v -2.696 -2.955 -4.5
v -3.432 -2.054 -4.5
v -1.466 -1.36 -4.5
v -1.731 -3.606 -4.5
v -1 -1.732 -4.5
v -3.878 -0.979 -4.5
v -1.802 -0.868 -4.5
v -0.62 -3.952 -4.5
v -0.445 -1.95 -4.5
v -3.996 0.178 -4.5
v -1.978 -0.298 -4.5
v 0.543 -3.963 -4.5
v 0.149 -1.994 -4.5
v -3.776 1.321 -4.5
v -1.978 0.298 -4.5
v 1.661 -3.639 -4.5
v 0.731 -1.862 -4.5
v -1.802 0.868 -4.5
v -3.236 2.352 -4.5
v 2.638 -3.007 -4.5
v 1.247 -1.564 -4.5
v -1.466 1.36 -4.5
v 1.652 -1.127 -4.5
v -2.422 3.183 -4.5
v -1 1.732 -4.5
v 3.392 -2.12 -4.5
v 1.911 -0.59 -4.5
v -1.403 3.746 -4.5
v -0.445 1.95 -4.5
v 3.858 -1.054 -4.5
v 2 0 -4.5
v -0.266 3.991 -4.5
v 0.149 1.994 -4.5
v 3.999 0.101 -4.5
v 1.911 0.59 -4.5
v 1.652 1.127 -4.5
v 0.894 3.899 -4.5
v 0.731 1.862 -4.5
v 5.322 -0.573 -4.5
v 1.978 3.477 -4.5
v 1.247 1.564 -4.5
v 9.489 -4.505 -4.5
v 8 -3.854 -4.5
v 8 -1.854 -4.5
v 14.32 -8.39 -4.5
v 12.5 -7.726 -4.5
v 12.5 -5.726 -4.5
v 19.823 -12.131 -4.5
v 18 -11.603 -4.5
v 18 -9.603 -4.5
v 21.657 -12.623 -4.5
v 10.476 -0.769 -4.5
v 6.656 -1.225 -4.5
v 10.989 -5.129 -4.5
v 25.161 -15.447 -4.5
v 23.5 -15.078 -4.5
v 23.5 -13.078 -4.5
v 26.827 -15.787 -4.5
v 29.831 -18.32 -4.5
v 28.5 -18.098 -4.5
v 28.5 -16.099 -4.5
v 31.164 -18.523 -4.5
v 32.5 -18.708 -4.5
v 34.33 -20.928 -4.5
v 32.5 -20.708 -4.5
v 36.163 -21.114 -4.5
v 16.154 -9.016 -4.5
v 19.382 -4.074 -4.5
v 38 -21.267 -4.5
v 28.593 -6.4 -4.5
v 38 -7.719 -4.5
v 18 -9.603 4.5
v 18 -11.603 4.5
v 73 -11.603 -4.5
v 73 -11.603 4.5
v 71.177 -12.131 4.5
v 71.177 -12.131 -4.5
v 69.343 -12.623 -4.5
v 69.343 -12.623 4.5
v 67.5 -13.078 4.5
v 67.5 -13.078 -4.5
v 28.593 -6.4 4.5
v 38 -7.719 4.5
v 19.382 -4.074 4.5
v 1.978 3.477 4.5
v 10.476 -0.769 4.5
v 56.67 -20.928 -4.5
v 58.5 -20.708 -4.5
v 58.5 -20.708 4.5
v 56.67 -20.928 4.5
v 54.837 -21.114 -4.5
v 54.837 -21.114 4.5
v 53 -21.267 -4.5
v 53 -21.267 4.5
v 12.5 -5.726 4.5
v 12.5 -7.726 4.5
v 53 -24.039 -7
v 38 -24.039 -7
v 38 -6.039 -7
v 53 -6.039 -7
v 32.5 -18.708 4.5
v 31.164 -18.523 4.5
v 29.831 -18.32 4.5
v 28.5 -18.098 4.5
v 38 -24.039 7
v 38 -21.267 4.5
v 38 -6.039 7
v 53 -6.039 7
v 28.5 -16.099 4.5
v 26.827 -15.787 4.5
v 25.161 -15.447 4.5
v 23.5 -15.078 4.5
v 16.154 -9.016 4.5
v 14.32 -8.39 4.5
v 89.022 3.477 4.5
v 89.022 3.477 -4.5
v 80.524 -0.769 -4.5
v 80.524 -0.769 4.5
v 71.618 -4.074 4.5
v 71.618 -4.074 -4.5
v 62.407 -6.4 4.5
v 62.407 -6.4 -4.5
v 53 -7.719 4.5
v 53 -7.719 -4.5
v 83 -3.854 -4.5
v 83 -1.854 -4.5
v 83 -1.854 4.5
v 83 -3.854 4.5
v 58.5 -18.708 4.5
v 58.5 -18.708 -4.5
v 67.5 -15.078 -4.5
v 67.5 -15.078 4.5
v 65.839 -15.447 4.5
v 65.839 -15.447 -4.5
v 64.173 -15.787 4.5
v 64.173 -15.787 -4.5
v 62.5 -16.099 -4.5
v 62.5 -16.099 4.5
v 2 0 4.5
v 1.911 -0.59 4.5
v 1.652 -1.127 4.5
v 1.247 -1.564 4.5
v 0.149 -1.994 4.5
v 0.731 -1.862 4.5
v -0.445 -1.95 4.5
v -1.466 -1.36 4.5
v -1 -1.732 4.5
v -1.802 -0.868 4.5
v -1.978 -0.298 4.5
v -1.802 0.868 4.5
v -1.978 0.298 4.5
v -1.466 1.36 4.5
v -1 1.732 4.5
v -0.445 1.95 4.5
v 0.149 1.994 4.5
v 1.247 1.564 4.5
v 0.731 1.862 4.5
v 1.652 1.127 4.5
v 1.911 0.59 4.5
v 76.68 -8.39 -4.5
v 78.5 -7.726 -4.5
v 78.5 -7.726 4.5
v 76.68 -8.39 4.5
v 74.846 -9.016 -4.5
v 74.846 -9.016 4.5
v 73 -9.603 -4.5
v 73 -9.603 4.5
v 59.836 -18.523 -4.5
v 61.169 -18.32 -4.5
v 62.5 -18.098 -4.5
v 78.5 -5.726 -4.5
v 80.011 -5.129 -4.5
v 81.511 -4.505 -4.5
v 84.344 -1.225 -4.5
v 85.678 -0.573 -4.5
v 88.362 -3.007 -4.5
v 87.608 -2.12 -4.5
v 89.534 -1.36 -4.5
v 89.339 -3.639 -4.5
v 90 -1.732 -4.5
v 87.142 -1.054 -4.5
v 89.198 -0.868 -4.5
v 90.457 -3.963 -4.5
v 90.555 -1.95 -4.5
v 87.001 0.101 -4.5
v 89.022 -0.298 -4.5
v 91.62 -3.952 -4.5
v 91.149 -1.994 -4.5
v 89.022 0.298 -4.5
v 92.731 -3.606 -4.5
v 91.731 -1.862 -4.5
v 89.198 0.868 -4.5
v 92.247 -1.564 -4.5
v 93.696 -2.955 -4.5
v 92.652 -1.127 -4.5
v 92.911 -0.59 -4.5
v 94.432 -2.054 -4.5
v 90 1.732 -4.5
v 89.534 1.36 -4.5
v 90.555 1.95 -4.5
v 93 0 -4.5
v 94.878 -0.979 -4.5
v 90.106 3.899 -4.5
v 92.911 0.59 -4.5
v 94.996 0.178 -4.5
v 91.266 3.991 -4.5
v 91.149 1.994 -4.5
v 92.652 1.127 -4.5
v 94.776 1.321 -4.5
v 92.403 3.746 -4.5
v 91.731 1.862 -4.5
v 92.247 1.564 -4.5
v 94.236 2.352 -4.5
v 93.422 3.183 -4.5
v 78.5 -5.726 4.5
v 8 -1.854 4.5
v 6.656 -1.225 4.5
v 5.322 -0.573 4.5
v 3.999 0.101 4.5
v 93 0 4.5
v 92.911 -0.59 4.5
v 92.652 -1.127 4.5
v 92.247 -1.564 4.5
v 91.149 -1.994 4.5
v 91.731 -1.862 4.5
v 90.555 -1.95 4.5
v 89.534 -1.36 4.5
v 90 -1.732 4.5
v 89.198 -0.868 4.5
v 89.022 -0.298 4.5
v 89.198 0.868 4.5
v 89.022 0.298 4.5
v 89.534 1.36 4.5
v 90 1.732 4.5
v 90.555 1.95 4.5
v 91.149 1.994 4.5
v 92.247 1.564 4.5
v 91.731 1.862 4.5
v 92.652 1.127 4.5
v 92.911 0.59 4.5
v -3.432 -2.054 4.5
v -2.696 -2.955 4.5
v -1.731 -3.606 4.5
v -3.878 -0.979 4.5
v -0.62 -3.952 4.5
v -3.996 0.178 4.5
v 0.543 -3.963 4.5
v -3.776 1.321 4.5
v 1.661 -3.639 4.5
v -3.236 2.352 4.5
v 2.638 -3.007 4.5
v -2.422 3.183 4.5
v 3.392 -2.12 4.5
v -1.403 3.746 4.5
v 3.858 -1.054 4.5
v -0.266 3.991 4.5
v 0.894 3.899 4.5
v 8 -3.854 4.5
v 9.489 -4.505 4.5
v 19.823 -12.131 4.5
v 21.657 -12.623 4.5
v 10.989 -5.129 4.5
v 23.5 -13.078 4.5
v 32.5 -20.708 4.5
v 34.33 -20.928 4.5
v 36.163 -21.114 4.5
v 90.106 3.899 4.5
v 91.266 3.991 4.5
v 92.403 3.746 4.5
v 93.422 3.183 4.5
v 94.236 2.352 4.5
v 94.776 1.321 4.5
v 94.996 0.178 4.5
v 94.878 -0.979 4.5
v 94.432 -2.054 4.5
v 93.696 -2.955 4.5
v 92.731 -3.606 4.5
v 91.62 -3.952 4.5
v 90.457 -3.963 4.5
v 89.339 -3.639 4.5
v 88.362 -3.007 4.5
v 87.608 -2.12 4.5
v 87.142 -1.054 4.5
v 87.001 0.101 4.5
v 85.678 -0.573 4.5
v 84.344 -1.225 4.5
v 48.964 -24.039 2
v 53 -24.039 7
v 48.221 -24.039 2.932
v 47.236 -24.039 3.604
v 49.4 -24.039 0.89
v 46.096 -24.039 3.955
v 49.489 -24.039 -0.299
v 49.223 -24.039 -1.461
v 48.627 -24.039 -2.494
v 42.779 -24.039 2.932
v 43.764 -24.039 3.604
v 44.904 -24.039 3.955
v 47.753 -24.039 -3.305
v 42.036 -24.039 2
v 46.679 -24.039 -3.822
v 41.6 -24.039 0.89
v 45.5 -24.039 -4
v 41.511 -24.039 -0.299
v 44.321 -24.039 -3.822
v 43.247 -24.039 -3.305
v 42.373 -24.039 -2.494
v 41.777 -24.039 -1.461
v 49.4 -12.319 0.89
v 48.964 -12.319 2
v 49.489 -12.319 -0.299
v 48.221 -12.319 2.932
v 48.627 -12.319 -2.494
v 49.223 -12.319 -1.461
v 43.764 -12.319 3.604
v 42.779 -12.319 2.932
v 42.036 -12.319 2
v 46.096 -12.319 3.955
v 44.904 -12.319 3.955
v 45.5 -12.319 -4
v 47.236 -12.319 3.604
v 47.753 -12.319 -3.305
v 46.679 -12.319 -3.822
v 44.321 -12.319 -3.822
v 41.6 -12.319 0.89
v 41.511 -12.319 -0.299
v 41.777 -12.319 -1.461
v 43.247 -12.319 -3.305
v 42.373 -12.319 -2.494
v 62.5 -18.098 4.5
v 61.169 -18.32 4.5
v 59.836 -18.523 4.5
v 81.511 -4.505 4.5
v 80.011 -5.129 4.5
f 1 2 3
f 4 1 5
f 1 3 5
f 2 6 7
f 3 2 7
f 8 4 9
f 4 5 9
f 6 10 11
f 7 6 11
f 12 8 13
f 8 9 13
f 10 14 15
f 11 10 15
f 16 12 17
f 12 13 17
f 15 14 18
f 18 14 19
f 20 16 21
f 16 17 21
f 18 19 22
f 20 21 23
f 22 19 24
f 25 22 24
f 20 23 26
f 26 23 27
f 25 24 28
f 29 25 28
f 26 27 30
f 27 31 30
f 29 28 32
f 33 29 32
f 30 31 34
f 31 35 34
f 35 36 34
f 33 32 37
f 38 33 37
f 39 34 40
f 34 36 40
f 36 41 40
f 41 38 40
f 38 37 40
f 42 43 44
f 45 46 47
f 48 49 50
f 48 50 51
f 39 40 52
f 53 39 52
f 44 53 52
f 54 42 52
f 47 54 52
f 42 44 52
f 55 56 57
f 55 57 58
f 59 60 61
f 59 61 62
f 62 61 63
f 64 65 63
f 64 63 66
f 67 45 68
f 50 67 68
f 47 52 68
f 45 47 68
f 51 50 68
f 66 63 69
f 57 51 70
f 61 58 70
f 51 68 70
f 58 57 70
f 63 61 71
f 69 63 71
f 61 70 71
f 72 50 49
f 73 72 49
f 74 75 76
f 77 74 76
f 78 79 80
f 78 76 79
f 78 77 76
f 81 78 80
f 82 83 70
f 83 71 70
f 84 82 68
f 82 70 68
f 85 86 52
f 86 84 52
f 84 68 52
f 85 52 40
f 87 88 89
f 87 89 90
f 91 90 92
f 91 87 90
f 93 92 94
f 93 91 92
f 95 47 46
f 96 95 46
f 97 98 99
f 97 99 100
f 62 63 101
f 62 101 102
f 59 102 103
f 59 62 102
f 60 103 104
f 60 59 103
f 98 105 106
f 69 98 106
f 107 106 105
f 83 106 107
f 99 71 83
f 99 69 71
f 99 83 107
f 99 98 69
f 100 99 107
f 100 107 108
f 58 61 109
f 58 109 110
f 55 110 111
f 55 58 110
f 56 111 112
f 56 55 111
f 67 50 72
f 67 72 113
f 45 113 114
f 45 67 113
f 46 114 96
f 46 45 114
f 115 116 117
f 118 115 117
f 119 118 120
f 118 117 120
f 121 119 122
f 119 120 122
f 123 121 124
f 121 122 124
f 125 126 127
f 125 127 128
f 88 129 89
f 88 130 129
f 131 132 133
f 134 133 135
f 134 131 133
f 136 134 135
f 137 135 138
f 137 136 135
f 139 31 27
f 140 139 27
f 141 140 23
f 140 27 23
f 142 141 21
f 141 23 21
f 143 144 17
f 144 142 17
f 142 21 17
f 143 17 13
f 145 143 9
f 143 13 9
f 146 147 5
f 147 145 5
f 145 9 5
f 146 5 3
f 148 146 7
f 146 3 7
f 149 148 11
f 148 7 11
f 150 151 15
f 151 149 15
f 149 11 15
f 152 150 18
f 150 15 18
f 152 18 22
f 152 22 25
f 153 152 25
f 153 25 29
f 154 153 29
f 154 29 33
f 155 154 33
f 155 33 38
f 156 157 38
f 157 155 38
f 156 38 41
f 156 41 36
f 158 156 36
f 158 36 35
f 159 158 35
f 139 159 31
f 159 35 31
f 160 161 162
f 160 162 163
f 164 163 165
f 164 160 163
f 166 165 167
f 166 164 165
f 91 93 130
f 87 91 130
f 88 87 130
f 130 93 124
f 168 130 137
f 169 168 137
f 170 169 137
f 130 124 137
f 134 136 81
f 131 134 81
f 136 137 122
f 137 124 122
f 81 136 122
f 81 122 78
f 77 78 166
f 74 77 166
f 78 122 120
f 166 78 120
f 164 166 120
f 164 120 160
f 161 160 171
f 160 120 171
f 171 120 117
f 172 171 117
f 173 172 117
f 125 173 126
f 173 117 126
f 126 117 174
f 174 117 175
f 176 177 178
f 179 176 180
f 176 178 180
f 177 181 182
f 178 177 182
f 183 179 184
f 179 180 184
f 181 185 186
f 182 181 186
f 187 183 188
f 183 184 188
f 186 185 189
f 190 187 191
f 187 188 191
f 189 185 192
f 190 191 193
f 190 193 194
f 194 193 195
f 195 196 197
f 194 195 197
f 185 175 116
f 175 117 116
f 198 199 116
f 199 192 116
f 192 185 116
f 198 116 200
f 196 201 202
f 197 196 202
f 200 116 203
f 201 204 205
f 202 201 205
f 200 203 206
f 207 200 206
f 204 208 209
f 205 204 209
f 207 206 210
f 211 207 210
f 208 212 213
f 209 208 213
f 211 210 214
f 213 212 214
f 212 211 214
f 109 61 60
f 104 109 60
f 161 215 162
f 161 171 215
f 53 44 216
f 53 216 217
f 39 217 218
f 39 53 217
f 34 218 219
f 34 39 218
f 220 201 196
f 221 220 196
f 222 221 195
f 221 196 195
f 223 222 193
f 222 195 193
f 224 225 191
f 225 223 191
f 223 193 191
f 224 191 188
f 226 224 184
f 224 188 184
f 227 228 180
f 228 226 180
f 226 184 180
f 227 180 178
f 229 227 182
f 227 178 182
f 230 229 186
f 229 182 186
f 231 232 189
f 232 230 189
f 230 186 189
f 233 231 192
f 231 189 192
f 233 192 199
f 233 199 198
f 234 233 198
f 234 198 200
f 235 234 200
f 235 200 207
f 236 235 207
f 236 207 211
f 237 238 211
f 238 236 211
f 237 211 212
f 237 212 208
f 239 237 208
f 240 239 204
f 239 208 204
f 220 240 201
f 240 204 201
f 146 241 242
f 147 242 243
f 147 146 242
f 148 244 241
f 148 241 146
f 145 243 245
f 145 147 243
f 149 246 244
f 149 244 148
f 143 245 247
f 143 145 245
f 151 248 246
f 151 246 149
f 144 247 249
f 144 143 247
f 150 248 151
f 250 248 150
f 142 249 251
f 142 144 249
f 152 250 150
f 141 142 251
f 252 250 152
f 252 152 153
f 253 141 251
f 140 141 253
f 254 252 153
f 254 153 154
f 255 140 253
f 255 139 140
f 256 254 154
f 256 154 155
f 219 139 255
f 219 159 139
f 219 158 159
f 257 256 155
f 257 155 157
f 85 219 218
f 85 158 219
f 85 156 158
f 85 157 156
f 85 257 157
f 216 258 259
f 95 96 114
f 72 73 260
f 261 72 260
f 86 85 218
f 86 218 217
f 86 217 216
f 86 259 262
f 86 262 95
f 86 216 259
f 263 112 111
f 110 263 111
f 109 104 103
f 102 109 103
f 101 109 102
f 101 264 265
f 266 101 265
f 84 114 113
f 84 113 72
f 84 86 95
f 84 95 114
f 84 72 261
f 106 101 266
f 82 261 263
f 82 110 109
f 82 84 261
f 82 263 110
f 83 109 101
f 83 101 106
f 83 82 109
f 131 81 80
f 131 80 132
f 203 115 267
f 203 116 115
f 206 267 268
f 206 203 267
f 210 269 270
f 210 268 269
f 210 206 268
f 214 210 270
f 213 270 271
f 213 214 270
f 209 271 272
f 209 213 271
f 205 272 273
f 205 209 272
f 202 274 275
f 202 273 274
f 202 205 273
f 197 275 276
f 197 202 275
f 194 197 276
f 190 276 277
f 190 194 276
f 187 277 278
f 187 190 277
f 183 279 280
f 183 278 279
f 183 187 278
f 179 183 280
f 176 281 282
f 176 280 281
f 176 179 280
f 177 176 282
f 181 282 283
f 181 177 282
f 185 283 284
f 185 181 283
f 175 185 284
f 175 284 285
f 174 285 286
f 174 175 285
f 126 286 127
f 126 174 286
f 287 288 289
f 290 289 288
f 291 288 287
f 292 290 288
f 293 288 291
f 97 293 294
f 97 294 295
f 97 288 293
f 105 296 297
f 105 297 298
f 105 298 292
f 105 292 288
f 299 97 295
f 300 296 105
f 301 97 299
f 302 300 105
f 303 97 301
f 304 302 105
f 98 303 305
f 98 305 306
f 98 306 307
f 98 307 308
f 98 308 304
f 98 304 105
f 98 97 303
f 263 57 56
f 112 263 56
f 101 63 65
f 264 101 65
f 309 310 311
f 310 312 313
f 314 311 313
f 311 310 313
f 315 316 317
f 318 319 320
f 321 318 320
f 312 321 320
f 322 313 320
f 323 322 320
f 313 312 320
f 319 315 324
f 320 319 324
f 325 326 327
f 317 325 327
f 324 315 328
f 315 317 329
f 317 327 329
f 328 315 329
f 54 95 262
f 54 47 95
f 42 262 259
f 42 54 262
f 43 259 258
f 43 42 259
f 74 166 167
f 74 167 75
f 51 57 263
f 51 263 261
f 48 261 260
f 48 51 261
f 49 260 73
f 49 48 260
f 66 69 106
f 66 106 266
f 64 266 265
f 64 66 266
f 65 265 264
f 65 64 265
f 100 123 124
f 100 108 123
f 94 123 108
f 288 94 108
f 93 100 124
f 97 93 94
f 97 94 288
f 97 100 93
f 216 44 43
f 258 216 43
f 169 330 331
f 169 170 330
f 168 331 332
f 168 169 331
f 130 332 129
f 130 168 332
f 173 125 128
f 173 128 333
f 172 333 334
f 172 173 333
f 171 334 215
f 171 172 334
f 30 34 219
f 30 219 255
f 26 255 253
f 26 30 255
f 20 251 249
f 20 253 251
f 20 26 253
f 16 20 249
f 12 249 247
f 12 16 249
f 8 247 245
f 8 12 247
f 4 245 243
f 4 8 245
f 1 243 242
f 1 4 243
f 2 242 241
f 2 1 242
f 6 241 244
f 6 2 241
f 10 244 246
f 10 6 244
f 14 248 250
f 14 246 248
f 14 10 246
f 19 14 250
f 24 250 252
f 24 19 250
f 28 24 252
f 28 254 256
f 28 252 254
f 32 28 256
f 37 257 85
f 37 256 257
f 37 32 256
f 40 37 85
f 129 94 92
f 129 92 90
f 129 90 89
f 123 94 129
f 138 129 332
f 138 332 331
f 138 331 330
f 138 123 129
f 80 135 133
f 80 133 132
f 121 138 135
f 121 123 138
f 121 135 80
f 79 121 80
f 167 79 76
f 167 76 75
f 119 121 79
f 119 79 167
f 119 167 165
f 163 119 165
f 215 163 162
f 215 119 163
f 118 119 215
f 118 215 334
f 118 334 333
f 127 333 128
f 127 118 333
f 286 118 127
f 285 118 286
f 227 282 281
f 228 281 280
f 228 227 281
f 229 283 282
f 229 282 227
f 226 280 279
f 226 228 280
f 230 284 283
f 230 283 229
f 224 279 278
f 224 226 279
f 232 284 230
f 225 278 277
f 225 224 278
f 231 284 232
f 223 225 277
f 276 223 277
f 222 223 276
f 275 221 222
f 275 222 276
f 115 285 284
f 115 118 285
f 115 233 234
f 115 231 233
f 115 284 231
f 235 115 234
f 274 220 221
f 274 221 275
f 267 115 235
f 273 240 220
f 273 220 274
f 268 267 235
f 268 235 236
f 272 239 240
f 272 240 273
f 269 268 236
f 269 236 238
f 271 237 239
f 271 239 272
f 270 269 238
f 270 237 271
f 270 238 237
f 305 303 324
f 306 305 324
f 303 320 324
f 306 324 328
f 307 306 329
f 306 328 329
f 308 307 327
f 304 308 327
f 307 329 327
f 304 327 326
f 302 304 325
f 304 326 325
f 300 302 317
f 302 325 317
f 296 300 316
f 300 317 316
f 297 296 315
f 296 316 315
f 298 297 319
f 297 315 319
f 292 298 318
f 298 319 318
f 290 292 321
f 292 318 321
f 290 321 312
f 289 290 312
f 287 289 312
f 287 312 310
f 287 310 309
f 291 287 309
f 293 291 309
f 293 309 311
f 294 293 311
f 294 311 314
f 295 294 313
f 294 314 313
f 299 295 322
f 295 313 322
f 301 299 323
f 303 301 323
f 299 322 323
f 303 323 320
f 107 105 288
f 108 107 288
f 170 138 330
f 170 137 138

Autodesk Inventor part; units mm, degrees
ref_plane "YZ Plane" through (0, 0, 0) normal (1, 0, 0) x (0, 1, 0)
ref_plane "XZ Plane" through (0, 0, 0) normal (0, 1, 0) x (-1, 0, 0)
ref_plane "XY Plane" through (0, 0, 0) normal (0, 0, 1) x (1, 0, 0)
sketch "Sketch1" plane through (0, 0, 0) normal (0, 0, 1) x (1, 0, 0)
  arc A0 (1.9783, 3.4766) -> (3.9987, 0.1008) centre (0, 0) ccw
  arc A1 (87.0013, 0.1008) -> (89.0217, 3.4766) centre (91, 0) ccw
  line L0 (0, 0) -> (109, 0) construction
  line L1 (8, -1.8544) -> (8, -3.8544)
  line L2 (83, -1.8544) -> (83, -3.8544)
  line L3 (45.5, 0) -> (45.5, -69) construction
  line L4 (12.5, -5.7261) -> (12.5, -7.7261)
  line L5 (78.5, -5.7261) -> (78.5, -7.7261)
  line L6 (18, -9.6033) -> (18, -11.6033)
  line L7 (73, -9.6033) -> (73, -11.6033)
  line L8 (23.5, -13.0781) -> (23.5, -15.0781)
  line L9 (67.5, -13.0781) -> (67.5, -15.0781)
  line L10 (28.5, -16.0985) -> (28.5, -18.0985)
  line L11 (62.5, -16.0985) -> (62.5, -18.0985)
  line L12 (32.5, -18.7085) -> (32.5, -20.7085)
  line L13 (58.5, -18.7085) -> (58.5, -20.7085)
  circle A2 centre (91, 0) radius 2
  circle A3 centre (0, 0) radius 2
  line L14 (38, -6.0391) -> (53, -6.0391)
  line L15 (53, -6.0391) -> (53, -24.0391)
  line L16 (53, -24.0391) -> (38, -24.0391)
  line L17 (38, -24.0391) -> (38, -6.0391)
  arc A4 (3.9987, 0.1008) -> (38, -9.726) centre (45.5, 79.9609) ccw
  arc A5 (53, -9.726) -> (87.0013, 0.1008) centre (45.5, 79.9609) ccw
  line L18 (0, -8.0391) -> (38, -8.0391) construction
  line L19 (53, -8.0391) -> (95.0831, -8.0391) construction
  arc A6 (1.9783, 3.4766) -> (38, -7.7189) centre (45.5, 79.9609) ccw
  arc A7 (53, -7.7189) -> (89.0217, 3.4766) centre (45.5, 79.9609) ccw
  arc A8 (8, -3.8544) -> (38, -11.5542) centre (45.5, 79.9609) ccw
  arc A9 (53, -11.5542) -> (83, -3.8544) centre (45.5, 79.9609) ccw
  arc A10 (12.5, -7.7261) -> (38, -13.4294) centre (45.5, 79.9609) ccw
  arc A11 (53, -13.4294) -> (78.5, -7.7261) centre (45.5, 79.9609) ccw
  arc A12 (18, -11.6033) -> (38, -15.3492) centre (45.5, 79.9609) ccw
  arc A13 (53, -15.3492) -> (73, -11.6033) centre (45.5, 79.9609) ccw
  arc A14 (23.5, -15.0781) -> (38, -17.3025) centre (45.5, 79.9609) ccw
  arc A15 (53, -17.3025) -> (67.5, -15.0781) centre (45.5, 79.9609) ccw
  arc A16 (28.5, -18.0985) -> (38, -19.2782) centre (45.5, 79.9609) ccw
  arc A17 (53, -19.2782) -> (62.5, -18.0985) centre (45.5, 79.9609) ccw
  arc A18 (32.5, -20.7085) -> (38, -21.267) centre (45.5, 79.9609) ccw
  arc A19 (53, -21.267) -> (58.5, -20.7085) centre (45.5, 79.9609) ccw
  dimension "d53" = 15
  dimension "d1" = 8
  dimension "d2" = 91
  dimension "d10" = 2
  dimension "d11" = 2
  dimension "d13" = 45.5
  dimension "d16" = 2
  dimension "d17" = 2
  dimension "d19" = 33
  dimension "d20" = 37.5
  dimension "d21" = 2
  dimension "d22" = 2
  dimension "d23" = 27.5
  dimension "d24" = 27.5
  dimension "d25" = 2
  dimension "d26" = 2
  dimension "d27" = 22
  dimension "d29" = 2
  dimension "d30" = 2
  dimension "d32" = 17
  dimension "d33" = 2
  dimension "d34" = 2
  dimension "d35" = 13
  dimension "d37" = 4
  dimension "d38" = 4
  dimension "d52" = 18
  dimension "d54" = 7.5
extrude "Extrusion5" add sketch "Sketch1" along normal mid plane 14 contours L17 L14 L15 L16
extrude "Extrusion6" add sketch "Sketch1" along normal mid plane 9 contours A6 L17 A4 A0 | A4 L17 A8 L1 | L17 A10 L4 A8 | L17 A12 L6 A10 | A7 A1 A5 L15 | L17 A14 L8 A12 | A5 L2 A9 L15 | L17 A16 L10 A14 | A9 L5 A11 L15 | L17 A18 L12 A16 | A11 L7 A13 L15 | A13 L9 A15 L15 | A15 L11 A17 L15 | A17 L13 A19 L15
sketch "Sketch2" plane through (38, -24.0391, 7) normal (0, -1, 0) x (1, 0, 0)
  circle A0 centre (7.5, -7) radius 4
  line L0 (15, -14) -> (0, -14) projected
  line L1 (0, -14) -> (0, 0) projected
  point P0 (-38, -7)
  dimension "d59" = 8
  dimension "d60" = 7
  dimension "d61" = 7.5
hole "Hole1" at (45.5, -24.0391, 0) direction (0, 1, 0) diameter 8 depth 11.72
equation "\"d19\" = d18"
equation "\"d32\" = d31"
equation "\"d18\" = 33"
equation "\"d31\" = 17"
properties part number "HUDSON-1-09-LEAF SPRING PACK"
